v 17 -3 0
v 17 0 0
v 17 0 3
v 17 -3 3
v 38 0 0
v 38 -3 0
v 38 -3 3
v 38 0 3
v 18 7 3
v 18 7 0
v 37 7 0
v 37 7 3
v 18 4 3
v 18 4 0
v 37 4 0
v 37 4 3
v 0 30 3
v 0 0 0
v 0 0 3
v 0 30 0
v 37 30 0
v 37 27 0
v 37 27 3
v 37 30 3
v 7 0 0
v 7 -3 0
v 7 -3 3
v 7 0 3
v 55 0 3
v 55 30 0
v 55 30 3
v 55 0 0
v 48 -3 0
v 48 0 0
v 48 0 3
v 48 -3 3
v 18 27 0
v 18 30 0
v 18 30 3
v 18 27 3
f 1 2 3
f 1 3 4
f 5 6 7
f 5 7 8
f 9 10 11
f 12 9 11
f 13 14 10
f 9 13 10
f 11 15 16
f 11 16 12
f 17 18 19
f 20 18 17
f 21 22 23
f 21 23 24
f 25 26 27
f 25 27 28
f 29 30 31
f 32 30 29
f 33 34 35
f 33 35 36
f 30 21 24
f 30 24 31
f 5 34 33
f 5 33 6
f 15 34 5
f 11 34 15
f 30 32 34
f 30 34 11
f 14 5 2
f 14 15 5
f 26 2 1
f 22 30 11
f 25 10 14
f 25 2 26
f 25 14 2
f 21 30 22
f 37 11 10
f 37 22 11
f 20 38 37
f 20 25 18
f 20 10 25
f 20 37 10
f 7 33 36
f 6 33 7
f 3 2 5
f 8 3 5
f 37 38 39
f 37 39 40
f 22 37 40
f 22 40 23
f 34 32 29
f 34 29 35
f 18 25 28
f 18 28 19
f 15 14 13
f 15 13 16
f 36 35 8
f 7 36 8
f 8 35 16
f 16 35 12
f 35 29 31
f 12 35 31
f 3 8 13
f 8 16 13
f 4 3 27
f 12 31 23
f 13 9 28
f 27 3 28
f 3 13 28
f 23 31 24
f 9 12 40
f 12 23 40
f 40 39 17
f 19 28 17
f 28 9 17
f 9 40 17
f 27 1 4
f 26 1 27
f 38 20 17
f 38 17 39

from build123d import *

# Parameters (mm, degrees)
SKETCH1_W           = 19
SKETCH1_H           = 3
BOSS_EXTRUDE1_DEPTH = 3


with BuildPart() as part:
    # Sketch1 → Boss-Extrude1 (new body)
    with BuildSketch(Plane.XY):
        Polygon((0, 0), (0, 30), (18, 30), (18, 27), (37, 27), (37, 30), (55, 30), (55, 0), (48, 0), (48, -3), (38, -3), (38, 0), (31, 0), (24, 0), (17, 0), (17, -3), (7, -3), (7, 0), align=None)
        with Locations((27.5, 5.5)):
            Rectangle(SKETCH1_W, SKETCH1_H, mode=Mode.SUBTRACT)
    extrude(amount=BOSS_EXTRUDE1_DEPTH)


solid = part.part
